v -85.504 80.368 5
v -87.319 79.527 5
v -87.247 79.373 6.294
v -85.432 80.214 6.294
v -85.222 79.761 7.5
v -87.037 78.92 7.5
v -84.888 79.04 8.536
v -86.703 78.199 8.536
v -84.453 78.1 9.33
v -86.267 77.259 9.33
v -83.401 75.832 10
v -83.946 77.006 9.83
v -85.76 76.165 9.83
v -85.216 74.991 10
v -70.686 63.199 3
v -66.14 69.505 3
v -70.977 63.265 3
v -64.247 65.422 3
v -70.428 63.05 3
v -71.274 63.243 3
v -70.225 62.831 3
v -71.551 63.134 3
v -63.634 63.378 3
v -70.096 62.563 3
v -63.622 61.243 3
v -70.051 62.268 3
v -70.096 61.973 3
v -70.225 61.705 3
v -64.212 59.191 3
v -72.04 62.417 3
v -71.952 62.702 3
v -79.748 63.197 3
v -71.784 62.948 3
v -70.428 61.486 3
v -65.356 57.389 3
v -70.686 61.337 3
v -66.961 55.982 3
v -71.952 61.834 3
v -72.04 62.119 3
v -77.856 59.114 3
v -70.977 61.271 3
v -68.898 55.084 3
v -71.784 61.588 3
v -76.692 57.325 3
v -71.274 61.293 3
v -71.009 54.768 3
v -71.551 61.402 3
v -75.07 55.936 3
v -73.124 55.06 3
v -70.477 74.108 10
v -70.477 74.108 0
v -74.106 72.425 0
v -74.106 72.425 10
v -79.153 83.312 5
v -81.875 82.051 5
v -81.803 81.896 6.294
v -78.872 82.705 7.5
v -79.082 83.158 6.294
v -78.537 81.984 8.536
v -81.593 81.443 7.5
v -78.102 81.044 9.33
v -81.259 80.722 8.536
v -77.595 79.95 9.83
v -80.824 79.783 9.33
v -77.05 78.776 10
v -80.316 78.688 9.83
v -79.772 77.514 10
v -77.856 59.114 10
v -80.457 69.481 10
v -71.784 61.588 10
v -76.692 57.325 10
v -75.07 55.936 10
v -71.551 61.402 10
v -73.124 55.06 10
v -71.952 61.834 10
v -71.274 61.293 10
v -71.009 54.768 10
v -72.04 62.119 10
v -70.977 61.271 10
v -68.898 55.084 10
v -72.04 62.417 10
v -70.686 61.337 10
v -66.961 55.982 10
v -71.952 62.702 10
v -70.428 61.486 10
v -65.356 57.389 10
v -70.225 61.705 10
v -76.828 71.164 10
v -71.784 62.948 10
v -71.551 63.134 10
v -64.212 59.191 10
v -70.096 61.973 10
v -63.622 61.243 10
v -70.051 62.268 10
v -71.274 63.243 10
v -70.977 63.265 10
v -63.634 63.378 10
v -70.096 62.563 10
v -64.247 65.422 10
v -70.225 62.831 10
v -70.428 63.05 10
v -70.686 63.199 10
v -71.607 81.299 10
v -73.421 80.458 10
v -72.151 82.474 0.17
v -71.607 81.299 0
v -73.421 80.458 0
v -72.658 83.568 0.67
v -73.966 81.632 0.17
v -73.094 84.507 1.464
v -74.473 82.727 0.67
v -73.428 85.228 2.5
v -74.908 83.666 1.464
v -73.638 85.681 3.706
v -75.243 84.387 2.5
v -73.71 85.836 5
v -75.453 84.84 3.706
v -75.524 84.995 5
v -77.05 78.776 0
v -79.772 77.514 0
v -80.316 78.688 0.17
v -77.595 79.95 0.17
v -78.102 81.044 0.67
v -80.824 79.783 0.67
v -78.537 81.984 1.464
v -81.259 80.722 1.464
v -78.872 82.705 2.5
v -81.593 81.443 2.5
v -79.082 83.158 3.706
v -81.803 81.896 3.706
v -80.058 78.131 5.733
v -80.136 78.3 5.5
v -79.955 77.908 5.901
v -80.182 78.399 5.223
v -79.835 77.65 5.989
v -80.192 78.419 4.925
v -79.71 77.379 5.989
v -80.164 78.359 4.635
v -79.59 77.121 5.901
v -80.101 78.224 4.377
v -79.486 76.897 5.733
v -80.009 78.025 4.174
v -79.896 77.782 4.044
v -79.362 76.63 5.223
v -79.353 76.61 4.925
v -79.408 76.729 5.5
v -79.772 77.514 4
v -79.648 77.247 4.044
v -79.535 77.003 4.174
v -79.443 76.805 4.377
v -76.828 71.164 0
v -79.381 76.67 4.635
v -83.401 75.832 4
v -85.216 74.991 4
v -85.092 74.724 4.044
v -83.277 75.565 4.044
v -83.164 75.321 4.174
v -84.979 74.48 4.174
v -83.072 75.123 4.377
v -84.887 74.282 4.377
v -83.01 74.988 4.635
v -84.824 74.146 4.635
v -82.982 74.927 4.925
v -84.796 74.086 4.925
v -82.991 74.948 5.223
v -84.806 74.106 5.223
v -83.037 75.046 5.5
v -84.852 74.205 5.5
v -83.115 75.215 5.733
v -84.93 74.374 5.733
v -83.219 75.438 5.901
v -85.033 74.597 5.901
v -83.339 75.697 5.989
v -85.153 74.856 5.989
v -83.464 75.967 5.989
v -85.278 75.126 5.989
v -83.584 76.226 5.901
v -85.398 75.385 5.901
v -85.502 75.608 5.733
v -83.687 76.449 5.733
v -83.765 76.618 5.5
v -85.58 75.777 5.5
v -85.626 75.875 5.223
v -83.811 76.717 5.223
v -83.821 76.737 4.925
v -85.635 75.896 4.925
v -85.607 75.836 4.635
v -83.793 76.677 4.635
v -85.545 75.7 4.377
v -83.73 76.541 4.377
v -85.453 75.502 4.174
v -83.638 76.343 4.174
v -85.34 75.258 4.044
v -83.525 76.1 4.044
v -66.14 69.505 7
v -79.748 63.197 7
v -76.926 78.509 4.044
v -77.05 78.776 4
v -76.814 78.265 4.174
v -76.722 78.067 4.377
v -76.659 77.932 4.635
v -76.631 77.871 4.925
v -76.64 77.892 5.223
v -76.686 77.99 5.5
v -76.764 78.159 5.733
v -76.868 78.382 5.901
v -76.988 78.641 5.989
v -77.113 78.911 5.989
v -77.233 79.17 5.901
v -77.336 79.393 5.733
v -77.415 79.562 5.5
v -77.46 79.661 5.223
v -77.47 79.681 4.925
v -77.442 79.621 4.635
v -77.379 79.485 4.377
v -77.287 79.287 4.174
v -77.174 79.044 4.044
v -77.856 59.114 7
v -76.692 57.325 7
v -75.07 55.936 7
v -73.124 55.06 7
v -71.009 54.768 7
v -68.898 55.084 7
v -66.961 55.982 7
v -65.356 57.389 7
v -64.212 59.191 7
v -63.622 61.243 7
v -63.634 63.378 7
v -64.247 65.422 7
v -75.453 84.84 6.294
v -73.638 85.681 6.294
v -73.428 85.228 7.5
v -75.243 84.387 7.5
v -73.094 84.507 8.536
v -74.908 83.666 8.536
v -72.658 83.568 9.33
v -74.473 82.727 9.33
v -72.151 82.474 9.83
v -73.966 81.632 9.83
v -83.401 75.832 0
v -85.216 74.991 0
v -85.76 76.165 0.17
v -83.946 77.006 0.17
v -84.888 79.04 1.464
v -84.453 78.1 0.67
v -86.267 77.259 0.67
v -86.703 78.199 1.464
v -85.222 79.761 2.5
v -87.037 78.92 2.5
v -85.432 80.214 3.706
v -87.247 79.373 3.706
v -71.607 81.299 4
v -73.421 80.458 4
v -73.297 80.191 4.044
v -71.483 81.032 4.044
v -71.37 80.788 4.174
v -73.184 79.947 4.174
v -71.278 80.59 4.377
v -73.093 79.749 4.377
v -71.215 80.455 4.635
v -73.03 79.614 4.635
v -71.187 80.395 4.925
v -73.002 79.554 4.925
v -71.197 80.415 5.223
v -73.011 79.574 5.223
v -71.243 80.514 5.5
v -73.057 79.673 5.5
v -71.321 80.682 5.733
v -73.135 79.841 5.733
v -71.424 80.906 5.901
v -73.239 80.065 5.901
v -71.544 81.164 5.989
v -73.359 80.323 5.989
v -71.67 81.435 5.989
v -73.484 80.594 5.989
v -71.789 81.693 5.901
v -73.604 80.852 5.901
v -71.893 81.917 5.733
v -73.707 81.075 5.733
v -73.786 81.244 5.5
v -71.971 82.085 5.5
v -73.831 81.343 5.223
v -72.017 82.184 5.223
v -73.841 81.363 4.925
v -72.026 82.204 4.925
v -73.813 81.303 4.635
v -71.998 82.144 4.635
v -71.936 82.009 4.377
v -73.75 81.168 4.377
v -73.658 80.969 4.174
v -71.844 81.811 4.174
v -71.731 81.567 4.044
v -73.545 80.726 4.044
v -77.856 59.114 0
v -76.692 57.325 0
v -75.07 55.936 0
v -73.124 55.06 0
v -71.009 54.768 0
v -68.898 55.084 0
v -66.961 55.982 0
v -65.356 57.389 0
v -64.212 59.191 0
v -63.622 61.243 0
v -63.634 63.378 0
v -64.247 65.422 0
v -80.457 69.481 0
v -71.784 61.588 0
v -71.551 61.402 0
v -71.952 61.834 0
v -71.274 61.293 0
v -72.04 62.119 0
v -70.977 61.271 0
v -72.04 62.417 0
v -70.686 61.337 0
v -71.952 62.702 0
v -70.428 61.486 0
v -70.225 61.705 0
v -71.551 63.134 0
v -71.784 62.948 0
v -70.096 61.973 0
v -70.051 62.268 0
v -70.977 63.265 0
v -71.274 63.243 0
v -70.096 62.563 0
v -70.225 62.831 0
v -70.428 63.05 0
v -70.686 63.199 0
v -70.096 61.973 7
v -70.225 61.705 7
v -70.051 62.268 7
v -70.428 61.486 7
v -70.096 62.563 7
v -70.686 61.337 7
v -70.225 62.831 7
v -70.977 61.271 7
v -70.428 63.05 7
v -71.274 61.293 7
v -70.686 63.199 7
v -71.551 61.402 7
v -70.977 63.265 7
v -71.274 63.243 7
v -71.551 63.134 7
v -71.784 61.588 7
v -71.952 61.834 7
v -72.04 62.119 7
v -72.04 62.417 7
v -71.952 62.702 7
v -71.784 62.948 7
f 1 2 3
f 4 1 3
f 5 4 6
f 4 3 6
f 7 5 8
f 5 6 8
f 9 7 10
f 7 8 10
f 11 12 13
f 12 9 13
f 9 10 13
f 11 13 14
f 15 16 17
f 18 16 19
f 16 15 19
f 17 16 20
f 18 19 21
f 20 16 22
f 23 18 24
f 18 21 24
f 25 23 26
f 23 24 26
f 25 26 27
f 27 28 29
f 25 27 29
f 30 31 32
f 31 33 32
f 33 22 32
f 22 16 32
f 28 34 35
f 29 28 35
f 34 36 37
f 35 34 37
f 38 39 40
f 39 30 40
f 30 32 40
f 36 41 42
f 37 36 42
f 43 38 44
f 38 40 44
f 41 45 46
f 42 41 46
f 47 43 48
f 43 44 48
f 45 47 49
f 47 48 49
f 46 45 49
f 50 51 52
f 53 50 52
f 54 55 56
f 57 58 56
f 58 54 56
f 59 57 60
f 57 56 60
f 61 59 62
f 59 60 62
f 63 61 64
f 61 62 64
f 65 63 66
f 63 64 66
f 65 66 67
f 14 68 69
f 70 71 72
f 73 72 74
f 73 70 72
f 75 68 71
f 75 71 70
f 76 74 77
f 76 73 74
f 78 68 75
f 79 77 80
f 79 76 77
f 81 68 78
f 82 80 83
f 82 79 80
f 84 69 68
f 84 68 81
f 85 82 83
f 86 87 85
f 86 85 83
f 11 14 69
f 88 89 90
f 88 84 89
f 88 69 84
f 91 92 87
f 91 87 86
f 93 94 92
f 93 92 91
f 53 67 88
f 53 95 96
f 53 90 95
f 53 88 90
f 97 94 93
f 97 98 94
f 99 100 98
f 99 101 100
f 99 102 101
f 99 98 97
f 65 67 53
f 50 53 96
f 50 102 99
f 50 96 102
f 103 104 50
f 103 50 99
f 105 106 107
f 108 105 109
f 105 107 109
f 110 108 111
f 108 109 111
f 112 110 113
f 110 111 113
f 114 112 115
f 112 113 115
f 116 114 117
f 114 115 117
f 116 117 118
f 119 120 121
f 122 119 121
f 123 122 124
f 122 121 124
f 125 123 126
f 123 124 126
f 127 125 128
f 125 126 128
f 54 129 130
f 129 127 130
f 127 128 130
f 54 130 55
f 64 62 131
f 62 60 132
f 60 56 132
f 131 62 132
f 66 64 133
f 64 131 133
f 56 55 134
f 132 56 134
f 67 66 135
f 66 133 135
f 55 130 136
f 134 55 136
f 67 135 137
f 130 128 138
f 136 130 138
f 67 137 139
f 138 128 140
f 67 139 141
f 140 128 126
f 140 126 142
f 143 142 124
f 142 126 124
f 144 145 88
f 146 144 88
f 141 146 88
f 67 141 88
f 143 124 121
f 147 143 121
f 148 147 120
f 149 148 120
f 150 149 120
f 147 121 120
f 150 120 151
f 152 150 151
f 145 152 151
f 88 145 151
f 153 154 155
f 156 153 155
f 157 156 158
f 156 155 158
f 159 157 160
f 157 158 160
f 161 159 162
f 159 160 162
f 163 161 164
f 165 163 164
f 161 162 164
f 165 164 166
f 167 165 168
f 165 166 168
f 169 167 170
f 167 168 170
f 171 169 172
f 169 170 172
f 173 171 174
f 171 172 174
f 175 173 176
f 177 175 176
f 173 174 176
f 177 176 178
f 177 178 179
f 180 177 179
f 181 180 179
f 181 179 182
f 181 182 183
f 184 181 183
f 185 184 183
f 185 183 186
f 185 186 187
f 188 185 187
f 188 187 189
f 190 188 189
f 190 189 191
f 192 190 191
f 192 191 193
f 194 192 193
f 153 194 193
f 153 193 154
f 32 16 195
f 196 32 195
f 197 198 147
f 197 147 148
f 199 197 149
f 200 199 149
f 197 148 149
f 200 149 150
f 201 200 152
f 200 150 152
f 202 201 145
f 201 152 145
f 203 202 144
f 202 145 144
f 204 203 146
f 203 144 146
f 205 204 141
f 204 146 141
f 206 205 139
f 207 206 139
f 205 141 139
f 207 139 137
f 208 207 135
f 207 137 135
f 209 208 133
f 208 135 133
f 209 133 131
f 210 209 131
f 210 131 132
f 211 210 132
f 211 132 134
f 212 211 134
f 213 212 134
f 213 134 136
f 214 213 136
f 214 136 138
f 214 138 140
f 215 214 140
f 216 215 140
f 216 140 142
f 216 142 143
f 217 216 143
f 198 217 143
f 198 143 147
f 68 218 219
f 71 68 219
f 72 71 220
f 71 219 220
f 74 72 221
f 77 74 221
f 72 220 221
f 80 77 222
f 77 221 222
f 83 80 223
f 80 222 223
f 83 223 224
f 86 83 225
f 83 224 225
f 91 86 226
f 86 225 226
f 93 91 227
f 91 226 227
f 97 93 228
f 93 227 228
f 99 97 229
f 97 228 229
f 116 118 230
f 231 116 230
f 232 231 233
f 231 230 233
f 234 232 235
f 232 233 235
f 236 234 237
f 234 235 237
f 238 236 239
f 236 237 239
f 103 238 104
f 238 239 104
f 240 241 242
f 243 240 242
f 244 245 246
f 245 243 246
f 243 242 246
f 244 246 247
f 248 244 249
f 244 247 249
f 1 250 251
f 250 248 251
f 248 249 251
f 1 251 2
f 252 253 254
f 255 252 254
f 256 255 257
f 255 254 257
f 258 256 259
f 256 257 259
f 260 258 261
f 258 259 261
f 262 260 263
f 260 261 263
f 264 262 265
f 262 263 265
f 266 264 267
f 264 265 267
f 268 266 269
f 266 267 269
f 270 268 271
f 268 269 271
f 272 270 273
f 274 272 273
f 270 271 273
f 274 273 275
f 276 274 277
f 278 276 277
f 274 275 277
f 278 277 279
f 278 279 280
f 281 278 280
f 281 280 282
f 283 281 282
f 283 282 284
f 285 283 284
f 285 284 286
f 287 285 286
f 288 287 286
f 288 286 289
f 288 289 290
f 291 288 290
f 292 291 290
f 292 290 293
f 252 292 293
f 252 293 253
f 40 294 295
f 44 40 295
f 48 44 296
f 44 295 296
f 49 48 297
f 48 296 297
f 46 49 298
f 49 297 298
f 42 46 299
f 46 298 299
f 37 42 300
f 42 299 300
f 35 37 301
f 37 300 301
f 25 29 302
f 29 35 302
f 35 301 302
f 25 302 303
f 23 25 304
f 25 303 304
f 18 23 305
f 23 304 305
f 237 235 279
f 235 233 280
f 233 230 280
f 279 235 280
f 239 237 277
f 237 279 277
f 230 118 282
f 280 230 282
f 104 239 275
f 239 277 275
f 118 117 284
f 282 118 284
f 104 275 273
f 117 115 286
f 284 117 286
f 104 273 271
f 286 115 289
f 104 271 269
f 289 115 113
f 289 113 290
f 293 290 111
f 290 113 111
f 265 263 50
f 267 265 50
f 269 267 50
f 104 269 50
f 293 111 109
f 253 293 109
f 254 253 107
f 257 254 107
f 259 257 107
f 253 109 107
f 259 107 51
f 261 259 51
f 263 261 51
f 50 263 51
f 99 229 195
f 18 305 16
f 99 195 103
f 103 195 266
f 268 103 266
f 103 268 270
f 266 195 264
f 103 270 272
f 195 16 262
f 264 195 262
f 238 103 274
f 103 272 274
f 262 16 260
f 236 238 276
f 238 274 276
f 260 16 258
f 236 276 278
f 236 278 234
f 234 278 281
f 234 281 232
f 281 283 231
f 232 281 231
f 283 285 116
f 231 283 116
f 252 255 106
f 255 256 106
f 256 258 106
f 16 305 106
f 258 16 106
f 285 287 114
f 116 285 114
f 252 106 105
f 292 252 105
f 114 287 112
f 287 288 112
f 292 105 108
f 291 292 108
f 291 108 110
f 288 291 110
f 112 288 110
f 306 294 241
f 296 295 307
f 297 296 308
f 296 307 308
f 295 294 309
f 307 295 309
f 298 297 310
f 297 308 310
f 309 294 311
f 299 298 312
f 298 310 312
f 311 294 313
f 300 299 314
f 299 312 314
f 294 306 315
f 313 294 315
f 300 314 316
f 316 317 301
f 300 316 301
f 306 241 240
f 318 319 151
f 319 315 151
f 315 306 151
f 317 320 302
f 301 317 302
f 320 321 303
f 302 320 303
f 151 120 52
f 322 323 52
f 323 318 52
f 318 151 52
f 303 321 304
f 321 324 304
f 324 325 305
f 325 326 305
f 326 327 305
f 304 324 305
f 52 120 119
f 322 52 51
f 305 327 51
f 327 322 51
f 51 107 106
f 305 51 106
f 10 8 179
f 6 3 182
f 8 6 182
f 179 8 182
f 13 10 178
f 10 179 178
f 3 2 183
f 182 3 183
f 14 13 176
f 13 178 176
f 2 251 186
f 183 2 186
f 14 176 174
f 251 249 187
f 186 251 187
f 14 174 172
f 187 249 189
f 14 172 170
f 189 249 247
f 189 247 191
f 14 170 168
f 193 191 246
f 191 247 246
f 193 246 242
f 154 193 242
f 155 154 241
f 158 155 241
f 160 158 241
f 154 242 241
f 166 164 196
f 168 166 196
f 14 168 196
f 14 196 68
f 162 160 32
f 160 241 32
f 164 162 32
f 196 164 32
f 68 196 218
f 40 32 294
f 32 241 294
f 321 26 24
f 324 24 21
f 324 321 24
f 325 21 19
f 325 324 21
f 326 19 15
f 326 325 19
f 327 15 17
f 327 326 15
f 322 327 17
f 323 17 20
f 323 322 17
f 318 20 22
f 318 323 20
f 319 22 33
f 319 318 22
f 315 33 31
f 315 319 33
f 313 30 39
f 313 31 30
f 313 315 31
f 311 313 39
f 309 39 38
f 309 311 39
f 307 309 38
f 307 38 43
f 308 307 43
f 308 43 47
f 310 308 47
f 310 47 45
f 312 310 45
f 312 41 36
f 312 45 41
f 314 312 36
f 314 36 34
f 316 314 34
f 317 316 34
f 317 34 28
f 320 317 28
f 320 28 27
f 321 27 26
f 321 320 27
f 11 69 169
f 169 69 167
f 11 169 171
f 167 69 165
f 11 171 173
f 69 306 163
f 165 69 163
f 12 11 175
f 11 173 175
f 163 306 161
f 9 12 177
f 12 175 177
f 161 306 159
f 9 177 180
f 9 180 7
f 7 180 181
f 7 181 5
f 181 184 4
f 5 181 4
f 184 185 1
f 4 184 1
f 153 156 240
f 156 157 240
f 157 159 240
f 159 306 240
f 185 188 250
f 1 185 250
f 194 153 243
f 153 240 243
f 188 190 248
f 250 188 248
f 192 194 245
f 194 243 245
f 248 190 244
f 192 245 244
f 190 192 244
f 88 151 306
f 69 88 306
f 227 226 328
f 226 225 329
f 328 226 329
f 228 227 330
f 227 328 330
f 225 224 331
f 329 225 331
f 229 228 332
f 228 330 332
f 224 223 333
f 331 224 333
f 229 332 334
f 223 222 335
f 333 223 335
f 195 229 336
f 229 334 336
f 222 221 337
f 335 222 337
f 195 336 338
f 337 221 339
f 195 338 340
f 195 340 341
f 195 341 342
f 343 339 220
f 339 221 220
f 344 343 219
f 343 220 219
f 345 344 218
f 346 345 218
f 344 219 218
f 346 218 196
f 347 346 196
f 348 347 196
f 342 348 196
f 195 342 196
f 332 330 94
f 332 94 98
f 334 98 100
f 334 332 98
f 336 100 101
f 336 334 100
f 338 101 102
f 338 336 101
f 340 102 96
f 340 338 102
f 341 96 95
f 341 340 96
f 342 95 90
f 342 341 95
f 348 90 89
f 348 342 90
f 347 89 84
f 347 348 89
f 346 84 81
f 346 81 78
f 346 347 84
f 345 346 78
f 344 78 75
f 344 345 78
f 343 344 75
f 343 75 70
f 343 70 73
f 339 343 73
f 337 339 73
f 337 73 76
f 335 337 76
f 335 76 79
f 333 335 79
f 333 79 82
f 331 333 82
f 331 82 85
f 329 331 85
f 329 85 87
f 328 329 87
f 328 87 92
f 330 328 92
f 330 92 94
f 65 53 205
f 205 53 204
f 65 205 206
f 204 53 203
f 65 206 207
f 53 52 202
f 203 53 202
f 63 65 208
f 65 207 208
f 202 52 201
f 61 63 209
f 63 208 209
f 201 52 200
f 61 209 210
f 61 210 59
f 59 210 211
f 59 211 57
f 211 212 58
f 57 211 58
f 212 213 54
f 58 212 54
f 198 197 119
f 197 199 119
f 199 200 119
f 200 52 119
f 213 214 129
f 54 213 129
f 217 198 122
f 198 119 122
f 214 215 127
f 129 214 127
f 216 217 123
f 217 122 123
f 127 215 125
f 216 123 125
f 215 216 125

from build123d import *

# Parameters (mm, degrees)
ESQUISSE1_R             = 1
BOSS_EXTRU_1_DEPTH      = 10
ESQUISSE2_W             = 4
ESQUISSE2_H             = 7.5
ESQUISSE2_H_2           = 4.5
ENL_V_MAT_EXTRU_1_DEPTH = 15


with BuildPart() as part:
    # Esquisse1 → Boss.-Extru.1 (new body)
    with BuildSketch(Plane.XY):
        with BuildLine():
            ThreePointArc((-77.855878935, 59.113903977), (-67.897166599, 55.463691844), (-64.246954466, 65.422404179))
            Line((-64.246954466, 65.422404179), (-73.709704769, 85.835790883))
            Line((-73.709704769, 85.835790883), (-75.524228032, 84.994657522))
            Line((-75.524228032, 84.994657522), (-70.47742787, 74.107517947))
            Line((-70.47742787, 74.107517947), (-74.106474395, 72.425251227))
            Line((-74.106474395, 72.425251227), (-79.153274557, 83.312390802))
            Line((-79.153274557, 83.312390802), (-81.875059451, 82.050690761))
            Line((-81.875059451, 82.050690761), (-76.828259289, 71.163551186))
            Line((-76.828259289, 71.163551186), (-80.457305814, 69.481284466))
            Line((-80.457305814, 69.481284466), (-85.504105976, 80.368424041))
            Line((-85.504105976, 80.368424041), (-87.318629238, 79.52729068))
            Line((-87.318629238, 79.52729068), (-77.855878935, 59.113903977))
        make_face()
        with Locations((-71.0514167, 62.268154078)):
            Circle(ESQUISSE1_R, mode=Mode.SUBTRACT)
    extrude(amount=BOSS_EXTRU_1_DEPTH)

    # Esquisse2 → Enlèv. mat.-Extru.1 (cut)
    with BuildSketch(Plane(origin=(-41.529278226, -19.251151014, 0), x_dir=(0, 0, 1), z_dir=(-0.9072616312569987, -0.42056668014583576, 0))):
        with BuildLine():
            Line((5, 108.875365486), (0, 108.875365486))
            Line((0, 108.875365486), (0, 103.875365486))
            ThreePointArc((0, 103.875365486), (1.464466094, 107.410899392), (5, 108.875365486))
        make_face()
        with BuildLine():
            Line((10, 108.875365486), (5, 108.875365486))
            ThreePointArc((5, 108.875365486), (8.535533906, 107.410899392), (10, 103.875365486))
            Line((10, 103.875365486), (10, 108.875365486))
        make_face()
        with BuildLine():
            ThreePointArc((6, 103.875365486), (5, 104.875365486), (4, 103.875365486))
            Line((4, 103.875365486), (6, 103.875365486))
        make_face()
        with BuildLine():
            Line((6, 103.875365486), (4, 103.875365486))
            ThreePointArc((4, 103.875365486), (5, 102.875365486), (6, 103.875365486))
        make_face()
        with Locations((5, 82.625365486)):
            Rectangle(ESQUISSE2_W, ESQUISSE2_H)
        with Locations((5, 88.625365486)):
            Rectangle(ESQUISSE2_W, ESQUISSE2_H_2)
    extrude(amount=-ENL_V_MAT_EXTRU_1_DEPTH, mode=Mode.SUBTRACT)


solid = part.part
